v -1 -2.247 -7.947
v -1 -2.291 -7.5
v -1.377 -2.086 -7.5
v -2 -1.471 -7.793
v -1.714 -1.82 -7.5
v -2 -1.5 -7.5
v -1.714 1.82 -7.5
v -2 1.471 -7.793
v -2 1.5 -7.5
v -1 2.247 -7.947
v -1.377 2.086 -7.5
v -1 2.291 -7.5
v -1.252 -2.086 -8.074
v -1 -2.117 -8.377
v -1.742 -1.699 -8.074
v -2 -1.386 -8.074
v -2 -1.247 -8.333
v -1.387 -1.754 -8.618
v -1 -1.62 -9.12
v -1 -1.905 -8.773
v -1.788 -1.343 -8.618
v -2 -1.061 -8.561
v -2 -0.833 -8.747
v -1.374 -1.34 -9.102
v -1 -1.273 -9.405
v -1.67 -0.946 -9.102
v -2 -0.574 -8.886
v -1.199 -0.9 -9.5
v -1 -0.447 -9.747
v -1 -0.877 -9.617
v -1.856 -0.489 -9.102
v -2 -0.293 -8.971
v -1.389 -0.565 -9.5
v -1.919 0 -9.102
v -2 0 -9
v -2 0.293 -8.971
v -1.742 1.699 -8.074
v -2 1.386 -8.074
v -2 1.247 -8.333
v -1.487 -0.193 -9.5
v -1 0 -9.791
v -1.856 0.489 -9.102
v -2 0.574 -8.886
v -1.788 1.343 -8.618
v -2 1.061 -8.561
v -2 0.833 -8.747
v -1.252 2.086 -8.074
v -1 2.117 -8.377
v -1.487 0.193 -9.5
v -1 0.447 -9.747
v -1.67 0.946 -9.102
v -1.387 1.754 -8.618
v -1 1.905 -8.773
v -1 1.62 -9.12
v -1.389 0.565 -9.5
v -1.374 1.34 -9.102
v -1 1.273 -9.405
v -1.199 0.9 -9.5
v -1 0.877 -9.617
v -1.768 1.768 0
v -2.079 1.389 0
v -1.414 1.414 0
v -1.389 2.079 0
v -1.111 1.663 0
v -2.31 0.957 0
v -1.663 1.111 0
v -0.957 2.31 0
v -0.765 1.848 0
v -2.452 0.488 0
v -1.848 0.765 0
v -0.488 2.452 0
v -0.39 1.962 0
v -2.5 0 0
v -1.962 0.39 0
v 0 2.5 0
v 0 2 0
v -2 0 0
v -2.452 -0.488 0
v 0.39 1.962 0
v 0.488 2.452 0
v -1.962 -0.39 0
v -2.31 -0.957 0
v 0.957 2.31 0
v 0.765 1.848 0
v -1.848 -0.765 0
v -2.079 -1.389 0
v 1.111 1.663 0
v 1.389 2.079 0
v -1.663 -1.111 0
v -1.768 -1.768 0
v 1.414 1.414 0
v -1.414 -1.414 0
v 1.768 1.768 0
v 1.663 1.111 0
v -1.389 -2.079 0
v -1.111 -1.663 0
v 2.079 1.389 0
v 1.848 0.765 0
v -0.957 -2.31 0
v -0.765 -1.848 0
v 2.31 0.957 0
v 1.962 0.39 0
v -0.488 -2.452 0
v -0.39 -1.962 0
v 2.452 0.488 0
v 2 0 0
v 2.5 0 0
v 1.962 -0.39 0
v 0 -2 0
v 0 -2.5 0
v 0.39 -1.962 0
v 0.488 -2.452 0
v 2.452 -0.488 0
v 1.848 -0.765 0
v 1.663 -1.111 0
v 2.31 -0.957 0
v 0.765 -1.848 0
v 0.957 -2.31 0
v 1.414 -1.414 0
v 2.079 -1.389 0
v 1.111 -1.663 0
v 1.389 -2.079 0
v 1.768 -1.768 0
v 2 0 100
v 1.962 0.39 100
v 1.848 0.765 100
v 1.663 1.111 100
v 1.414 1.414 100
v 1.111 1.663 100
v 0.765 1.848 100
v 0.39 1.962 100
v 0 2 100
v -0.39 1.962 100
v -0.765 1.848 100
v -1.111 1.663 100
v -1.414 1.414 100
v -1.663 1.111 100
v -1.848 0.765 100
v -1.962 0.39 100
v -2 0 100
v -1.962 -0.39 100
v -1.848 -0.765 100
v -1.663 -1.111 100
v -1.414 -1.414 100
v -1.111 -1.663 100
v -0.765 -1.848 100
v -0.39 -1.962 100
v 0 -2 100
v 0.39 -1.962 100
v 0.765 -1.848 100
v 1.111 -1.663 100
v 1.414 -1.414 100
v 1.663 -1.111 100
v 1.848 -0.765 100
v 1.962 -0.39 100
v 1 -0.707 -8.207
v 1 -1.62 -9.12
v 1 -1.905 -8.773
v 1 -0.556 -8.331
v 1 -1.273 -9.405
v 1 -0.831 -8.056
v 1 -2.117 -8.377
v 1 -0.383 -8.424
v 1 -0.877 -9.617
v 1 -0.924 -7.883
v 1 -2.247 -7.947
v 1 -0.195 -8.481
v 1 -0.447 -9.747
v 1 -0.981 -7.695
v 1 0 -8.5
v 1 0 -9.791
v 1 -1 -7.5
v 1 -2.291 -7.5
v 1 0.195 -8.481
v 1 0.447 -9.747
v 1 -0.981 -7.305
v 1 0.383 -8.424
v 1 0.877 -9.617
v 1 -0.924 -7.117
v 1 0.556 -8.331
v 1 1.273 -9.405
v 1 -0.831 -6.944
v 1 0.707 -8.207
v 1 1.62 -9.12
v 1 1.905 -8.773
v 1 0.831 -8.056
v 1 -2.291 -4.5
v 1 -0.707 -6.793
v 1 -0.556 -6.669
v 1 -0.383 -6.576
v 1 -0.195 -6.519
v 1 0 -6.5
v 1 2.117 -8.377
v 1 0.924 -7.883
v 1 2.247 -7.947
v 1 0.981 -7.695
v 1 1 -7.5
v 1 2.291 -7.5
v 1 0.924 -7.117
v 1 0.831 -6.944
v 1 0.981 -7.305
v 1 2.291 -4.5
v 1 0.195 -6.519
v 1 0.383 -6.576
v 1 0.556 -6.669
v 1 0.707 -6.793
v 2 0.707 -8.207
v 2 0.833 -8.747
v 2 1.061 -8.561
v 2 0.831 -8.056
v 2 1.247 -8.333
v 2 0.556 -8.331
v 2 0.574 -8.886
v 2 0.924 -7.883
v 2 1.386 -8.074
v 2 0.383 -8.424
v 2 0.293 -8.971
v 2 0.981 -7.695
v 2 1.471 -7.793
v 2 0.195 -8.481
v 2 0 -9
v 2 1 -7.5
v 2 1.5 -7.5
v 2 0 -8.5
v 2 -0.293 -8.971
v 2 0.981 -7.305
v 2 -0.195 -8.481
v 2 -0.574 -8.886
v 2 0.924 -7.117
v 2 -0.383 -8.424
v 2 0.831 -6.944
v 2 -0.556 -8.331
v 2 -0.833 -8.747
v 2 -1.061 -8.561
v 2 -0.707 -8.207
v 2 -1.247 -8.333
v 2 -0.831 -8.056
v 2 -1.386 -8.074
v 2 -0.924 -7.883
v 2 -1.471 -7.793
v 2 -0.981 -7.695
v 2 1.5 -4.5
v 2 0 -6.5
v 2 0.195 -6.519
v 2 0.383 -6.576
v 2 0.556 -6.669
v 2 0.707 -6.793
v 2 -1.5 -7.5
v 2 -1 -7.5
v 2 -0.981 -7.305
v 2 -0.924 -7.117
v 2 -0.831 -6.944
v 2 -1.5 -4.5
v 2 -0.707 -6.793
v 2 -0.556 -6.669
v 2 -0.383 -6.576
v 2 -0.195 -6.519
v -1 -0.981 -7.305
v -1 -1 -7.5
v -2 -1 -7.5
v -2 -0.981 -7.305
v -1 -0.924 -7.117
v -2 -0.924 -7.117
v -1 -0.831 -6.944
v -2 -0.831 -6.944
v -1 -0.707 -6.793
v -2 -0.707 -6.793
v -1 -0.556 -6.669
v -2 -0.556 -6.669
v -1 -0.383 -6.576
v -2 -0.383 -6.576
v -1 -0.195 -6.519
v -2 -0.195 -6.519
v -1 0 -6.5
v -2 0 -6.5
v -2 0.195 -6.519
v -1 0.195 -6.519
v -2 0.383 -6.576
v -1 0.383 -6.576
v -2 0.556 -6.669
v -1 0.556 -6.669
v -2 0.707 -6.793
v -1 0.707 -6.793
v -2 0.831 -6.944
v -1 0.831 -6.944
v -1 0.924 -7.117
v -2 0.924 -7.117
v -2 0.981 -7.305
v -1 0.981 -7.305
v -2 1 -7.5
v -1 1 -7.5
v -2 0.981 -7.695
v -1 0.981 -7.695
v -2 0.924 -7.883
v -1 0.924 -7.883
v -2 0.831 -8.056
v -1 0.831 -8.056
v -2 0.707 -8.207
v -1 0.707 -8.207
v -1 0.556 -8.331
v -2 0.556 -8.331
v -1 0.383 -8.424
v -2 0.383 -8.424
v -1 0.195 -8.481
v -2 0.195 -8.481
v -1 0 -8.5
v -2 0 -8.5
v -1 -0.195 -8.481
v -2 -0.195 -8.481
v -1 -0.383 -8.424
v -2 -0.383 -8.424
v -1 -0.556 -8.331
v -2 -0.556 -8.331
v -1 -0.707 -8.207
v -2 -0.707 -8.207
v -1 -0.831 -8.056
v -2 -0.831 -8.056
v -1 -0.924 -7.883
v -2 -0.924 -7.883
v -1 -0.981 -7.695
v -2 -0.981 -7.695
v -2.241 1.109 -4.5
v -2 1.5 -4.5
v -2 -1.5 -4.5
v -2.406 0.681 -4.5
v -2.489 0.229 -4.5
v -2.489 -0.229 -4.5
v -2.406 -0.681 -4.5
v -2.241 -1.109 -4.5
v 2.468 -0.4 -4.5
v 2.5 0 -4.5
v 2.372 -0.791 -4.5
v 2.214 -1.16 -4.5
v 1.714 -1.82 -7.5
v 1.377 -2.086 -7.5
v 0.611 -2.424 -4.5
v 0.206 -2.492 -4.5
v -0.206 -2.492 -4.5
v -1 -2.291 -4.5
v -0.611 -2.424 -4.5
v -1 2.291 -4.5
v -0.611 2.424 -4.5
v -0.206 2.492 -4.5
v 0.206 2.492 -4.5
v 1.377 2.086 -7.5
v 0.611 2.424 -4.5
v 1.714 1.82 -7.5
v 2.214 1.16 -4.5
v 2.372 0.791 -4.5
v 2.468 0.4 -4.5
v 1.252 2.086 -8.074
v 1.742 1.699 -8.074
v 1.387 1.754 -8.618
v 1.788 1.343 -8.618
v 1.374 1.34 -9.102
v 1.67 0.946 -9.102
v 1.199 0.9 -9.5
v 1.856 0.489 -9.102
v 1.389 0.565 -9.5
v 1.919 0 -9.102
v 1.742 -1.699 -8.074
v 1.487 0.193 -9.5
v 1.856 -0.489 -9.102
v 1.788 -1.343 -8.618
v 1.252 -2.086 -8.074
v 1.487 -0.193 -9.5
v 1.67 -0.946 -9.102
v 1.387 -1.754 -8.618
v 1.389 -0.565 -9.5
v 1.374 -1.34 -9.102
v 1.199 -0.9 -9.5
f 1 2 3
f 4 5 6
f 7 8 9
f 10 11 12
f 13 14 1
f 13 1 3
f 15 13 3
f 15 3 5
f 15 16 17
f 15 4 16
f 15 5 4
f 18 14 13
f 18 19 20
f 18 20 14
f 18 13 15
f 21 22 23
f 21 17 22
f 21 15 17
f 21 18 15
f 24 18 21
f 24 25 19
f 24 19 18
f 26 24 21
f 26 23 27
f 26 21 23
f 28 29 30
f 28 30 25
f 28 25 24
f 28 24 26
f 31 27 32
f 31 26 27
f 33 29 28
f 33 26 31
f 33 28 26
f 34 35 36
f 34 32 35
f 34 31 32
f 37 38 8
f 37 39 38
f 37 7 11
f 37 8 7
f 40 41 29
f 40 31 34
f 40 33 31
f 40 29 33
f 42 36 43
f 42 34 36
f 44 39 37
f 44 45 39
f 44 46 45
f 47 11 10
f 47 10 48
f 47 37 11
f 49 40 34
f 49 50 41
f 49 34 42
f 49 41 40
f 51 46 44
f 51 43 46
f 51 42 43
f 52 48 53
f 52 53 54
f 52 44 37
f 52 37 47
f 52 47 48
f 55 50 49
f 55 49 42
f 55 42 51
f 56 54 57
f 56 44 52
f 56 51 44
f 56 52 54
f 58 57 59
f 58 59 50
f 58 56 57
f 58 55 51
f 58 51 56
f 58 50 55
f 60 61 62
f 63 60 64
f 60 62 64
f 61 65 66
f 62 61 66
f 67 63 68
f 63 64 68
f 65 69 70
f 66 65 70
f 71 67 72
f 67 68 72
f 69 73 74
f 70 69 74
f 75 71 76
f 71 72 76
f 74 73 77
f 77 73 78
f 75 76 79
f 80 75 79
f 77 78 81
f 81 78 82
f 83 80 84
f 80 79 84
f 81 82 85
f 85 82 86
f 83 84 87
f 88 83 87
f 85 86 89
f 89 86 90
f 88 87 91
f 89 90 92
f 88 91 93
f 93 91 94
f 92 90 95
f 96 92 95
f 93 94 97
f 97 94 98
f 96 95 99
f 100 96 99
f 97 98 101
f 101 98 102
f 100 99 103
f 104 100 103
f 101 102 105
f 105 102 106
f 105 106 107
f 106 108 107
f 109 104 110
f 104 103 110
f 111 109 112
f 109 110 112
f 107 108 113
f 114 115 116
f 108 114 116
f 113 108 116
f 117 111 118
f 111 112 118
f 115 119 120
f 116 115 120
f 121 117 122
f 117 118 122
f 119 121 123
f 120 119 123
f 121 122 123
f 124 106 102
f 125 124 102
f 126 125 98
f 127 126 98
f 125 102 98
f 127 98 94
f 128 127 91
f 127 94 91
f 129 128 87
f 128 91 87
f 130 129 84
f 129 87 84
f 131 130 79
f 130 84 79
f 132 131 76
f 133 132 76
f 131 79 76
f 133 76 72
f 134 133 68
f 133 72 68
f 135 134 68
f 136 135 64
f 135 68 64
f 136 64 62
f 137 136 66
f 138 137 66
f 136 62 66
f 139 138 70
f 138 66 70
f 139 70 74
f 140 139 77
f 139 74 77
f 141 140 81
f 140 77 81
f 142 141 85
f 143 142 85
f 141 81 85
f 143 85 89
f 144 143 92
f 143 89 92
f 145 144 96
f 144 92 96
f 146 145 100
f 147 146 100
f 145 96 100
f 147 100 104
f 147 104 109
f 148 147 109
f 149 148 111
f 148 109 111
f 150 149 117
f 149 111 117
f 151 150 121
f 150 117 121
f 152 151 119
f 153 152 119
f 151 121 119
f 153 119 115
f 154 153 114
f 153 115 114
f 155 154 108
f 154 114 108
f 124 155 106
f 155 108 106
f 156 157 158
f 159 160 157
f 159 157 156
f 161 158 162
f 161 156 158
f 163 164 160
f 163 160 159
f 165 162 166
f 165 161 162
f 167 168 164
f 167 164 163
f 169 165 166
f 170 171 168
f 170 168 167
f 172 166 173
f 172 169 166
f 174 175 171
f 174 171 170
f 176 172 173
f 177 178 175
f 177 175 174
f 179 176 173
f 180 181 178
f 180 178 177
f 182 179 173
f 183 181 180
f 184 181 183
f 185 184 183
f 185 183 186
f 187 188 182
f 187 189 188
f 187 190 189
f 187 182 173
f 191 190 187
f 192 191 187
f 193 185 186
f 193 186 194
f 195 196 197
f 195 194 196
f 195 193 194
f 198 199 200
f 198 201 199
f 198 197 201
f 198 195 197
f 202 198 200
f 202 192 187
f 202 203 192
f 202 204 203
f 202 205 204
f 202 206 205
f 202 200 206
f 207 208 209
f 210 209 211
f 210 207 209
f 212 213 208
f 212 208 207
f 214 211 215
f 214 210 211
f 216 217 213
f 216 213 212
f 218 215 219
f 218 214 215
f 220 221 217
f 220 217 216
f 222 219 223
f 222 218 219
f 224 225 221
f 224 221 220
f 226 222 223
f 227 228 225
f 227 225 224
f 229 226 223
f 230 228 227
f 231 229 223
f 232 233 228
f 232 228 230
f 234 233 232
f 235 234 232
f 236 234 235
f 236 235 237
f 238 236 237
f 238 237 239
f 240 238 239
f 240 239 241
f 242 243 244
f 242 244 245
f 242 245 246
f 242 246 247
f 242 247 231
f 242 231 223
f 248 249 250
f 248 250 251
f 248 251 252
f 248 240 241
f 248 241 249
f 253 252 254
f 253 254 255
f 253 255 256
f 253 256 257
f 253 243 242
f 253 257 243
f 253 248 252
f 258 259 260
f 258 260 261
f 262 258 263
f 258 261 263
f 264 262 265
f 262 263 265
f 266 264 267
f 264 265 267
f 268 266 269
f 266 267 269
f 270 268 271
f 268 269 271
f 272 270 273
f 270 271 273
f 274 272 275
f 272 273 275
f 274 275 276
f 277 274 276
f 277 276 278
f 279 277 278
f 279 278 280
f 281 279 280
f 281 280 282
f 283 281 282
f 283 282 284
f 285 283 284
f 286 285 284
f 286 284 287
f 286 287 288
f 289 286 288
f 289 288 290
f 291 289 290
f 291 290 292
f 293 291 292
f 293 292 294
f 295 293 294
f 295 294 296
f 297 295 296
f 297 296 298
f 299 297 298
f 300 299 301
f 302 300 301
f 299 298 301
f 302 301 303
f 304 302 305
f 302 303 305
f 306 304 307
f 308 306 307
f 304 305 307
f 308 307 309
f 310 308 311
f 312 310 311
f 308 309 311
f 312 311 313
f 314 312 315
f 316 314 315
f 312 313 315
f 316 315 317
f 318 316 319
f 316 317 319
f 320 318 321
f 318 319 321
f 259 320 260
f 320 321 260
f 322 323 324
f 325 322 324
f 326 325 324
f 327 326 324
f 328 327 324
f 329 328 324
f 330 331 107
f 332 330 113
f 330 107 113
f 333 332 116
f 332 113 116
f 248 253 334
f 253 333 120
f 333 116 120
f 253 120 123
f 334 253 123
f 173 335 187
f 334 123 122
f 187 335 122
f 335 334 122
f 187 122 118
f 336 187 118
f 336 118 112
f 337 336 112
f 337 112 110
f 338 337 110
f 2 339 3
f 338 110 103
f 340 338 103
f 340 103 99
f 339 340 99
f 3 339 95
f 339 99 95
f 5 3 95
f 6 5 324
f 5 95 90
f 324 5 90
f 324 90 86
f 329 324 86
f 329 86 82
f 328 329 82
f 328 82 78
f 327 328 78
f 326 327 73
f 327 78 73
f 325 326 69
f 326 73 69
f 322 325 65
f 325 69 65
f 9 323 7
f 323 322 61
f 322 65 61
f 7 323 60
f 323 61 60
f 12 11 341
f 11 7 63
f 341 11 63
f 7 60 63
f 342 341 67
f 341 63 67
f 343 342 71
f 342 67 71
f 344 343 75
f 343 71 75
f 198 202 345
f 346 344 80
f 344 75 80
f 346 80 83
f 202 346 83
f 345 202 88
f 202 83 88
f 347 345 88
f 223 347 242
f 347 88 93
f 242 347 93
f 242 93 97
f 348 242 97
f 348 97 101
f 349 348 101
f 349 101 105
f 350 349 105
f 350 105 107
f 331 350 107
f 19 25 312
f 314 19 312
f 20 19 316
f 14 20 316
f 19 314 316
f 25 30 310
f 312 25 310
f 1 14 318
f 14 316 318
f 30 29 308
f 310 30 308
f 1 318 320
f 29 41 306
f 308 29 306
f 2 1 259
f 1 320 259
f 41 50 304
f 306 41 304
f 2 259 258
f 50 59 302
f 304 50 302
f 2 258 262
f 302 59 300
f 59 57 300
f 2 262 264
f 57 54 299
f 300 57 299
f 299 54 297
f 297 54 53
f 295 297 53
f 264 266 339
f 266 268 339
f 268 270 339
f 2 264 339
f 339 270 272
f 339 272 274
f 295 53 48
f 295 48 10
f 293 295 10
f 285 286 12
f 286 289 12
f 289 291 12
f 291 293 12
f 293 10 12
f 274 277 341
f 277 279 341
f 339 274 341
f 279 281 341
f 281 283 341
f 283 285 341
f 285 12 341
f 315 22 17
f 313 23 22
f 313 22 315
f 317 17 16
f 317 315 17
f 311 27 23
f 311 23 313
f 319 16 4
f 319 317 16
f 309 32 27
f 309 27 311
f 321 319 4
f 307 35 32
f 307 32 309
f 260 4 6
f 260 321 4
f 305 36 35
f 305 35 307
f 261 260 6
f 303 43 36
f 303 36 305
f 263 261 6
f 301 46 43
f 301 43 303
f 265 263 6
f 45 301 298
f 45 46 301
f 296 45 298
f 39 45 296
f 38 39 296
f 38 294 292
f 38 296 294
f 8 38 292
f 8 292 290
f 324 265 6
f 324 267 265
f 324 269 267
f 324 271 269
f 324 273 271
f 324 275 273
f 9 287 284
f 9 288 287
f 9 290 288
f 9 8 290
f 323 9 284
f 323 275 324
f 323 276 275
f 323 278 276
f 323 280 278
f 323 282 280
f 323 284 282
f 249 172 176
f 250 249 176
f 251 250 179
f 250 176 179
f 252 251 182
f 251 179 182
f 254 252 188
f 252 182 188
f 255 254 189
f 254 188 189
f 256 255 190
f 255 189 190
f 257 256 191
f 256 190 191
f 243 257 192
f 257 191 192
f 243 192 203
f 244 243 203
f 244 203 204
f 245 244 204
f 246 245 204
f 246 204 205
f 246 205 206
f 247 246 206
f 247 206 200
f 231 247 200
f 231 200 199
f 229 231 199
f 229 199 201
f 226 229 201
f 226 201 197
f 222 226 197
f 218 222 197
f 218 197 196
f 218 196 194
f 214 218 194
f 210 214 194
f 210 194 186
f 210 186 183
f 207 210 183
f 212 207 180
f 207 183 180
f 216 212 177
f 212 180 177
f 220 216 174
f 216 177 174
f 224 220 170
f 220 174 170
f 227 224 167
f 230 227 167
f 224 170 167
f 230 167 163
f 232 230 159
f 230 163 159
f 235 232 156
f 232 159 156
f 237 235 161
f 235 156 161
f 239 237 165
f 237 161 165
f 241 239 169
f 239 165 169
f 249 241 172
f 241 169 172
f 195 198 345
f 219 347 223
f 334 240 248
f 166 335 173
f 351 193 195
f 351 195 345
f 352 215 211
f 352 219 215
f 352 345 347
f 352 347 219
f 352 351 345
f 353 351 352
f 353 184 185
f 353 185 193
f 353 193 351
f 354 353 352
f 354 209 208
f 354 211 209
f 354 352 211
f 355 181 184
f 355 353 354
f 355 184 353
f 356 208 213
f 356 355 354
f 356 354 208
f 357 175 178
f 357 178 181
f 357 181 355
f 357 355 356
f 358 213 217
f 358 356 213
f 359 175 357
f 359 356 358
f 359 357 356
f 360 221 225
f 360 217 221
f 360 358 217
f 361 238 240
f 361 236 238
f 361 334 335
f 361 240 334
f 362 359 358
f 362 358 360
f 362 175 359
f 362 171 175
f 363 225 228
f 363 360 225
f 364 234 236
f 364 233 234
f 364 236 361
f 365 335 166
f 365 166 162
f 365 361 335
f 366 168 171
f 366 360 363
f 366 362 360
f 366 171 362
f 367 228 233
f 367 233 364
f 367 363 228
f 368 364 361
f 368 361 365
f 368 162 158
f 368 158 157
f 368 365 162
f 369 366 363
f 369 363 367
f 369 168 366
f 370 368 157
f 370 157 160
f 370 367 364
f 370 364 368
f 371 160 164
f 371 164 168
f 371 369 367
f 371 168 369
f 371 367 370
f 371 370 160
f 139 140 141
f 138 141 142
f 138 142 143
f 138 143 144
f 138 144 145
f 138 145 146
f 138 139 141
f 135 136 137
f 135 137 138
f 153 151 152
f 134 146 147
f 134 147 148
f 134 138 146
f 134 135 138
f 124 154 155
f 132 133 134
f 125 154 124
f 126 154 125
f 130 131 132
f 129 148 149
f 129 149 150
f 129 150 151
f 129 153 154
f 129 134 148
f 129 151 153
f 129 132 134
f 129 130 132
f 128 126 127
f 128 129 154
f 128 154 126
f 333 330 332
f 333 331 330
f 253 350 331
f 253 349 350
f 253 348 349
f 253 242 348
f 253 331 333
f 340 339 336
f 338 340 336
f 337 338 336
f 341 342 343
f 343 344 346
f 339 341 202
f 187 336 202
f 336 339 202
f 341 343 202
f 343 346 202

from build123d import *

# Parameters (mm, degrees)
F0_R     = 2
F1_DEPTH = 100
F2_R     = 2.5
F3_DEPTH = 10
F4_R     = 2.5
F5_W     = 0.722433
F5_H     = 5.884245
F5_W_2   = 2
F5_W_3   = 0.957619
F6_DEPTH = 3.08
F7_R     = 1
F8_DEPTH = 4.501


with BuildPart() as f1:
    # F0 (on Top) → F1 (new body)
    with BuildSketch(Plane.XY):
        Circle(F0_R)
    extrude(amount=F1_DEPTH)

    # F2 (on face) → F3 (join)
    with BuildSketch(Plane(origin=(0, 0, 0), x_dir=(1, 0, 0), z_dir=(0, 0, -1))):
        Circle(F2_R)
    extrude(amount=F3_DEPTH)

    # F4
    f4_edges = [f1.edges().sort_by_distance(p)[0] for p in [
        (-2.5, 0, -10),
    ]]
    fillet(f4_edges, radius=F4_R)

    # F5 (on Front) → F6 (cut, symmetric)
    with BuildSketch(Plane.XZ):
        with Locations((-2.361216, -7.442122)):
            Rectangle(F5_W, F5_H)
        with Locations((0, -7.442122)):
            Rectangle(F5_W_2, F5_H)
        with Locations((2.478809, -7.442122)):
            Rectangle(F5_W_3, F5_H)
    extrude(amount=F6_DEPTH, both=True, mode=Mode.SUBTRACT)

    # F7 (on face) → F8 (cut, through all)
    with BuildSketch(Plane(origin=(-2, 0, 0), x_dir=(0, -1, 0), z_dir=(-1, 0, 0))):
        with Locations((0, -7.5)):
            Circle(F7_R)
    extrude(amount=-F8_DEPTH, mode=Mode.SUBTRACT)


solid = f1.part
